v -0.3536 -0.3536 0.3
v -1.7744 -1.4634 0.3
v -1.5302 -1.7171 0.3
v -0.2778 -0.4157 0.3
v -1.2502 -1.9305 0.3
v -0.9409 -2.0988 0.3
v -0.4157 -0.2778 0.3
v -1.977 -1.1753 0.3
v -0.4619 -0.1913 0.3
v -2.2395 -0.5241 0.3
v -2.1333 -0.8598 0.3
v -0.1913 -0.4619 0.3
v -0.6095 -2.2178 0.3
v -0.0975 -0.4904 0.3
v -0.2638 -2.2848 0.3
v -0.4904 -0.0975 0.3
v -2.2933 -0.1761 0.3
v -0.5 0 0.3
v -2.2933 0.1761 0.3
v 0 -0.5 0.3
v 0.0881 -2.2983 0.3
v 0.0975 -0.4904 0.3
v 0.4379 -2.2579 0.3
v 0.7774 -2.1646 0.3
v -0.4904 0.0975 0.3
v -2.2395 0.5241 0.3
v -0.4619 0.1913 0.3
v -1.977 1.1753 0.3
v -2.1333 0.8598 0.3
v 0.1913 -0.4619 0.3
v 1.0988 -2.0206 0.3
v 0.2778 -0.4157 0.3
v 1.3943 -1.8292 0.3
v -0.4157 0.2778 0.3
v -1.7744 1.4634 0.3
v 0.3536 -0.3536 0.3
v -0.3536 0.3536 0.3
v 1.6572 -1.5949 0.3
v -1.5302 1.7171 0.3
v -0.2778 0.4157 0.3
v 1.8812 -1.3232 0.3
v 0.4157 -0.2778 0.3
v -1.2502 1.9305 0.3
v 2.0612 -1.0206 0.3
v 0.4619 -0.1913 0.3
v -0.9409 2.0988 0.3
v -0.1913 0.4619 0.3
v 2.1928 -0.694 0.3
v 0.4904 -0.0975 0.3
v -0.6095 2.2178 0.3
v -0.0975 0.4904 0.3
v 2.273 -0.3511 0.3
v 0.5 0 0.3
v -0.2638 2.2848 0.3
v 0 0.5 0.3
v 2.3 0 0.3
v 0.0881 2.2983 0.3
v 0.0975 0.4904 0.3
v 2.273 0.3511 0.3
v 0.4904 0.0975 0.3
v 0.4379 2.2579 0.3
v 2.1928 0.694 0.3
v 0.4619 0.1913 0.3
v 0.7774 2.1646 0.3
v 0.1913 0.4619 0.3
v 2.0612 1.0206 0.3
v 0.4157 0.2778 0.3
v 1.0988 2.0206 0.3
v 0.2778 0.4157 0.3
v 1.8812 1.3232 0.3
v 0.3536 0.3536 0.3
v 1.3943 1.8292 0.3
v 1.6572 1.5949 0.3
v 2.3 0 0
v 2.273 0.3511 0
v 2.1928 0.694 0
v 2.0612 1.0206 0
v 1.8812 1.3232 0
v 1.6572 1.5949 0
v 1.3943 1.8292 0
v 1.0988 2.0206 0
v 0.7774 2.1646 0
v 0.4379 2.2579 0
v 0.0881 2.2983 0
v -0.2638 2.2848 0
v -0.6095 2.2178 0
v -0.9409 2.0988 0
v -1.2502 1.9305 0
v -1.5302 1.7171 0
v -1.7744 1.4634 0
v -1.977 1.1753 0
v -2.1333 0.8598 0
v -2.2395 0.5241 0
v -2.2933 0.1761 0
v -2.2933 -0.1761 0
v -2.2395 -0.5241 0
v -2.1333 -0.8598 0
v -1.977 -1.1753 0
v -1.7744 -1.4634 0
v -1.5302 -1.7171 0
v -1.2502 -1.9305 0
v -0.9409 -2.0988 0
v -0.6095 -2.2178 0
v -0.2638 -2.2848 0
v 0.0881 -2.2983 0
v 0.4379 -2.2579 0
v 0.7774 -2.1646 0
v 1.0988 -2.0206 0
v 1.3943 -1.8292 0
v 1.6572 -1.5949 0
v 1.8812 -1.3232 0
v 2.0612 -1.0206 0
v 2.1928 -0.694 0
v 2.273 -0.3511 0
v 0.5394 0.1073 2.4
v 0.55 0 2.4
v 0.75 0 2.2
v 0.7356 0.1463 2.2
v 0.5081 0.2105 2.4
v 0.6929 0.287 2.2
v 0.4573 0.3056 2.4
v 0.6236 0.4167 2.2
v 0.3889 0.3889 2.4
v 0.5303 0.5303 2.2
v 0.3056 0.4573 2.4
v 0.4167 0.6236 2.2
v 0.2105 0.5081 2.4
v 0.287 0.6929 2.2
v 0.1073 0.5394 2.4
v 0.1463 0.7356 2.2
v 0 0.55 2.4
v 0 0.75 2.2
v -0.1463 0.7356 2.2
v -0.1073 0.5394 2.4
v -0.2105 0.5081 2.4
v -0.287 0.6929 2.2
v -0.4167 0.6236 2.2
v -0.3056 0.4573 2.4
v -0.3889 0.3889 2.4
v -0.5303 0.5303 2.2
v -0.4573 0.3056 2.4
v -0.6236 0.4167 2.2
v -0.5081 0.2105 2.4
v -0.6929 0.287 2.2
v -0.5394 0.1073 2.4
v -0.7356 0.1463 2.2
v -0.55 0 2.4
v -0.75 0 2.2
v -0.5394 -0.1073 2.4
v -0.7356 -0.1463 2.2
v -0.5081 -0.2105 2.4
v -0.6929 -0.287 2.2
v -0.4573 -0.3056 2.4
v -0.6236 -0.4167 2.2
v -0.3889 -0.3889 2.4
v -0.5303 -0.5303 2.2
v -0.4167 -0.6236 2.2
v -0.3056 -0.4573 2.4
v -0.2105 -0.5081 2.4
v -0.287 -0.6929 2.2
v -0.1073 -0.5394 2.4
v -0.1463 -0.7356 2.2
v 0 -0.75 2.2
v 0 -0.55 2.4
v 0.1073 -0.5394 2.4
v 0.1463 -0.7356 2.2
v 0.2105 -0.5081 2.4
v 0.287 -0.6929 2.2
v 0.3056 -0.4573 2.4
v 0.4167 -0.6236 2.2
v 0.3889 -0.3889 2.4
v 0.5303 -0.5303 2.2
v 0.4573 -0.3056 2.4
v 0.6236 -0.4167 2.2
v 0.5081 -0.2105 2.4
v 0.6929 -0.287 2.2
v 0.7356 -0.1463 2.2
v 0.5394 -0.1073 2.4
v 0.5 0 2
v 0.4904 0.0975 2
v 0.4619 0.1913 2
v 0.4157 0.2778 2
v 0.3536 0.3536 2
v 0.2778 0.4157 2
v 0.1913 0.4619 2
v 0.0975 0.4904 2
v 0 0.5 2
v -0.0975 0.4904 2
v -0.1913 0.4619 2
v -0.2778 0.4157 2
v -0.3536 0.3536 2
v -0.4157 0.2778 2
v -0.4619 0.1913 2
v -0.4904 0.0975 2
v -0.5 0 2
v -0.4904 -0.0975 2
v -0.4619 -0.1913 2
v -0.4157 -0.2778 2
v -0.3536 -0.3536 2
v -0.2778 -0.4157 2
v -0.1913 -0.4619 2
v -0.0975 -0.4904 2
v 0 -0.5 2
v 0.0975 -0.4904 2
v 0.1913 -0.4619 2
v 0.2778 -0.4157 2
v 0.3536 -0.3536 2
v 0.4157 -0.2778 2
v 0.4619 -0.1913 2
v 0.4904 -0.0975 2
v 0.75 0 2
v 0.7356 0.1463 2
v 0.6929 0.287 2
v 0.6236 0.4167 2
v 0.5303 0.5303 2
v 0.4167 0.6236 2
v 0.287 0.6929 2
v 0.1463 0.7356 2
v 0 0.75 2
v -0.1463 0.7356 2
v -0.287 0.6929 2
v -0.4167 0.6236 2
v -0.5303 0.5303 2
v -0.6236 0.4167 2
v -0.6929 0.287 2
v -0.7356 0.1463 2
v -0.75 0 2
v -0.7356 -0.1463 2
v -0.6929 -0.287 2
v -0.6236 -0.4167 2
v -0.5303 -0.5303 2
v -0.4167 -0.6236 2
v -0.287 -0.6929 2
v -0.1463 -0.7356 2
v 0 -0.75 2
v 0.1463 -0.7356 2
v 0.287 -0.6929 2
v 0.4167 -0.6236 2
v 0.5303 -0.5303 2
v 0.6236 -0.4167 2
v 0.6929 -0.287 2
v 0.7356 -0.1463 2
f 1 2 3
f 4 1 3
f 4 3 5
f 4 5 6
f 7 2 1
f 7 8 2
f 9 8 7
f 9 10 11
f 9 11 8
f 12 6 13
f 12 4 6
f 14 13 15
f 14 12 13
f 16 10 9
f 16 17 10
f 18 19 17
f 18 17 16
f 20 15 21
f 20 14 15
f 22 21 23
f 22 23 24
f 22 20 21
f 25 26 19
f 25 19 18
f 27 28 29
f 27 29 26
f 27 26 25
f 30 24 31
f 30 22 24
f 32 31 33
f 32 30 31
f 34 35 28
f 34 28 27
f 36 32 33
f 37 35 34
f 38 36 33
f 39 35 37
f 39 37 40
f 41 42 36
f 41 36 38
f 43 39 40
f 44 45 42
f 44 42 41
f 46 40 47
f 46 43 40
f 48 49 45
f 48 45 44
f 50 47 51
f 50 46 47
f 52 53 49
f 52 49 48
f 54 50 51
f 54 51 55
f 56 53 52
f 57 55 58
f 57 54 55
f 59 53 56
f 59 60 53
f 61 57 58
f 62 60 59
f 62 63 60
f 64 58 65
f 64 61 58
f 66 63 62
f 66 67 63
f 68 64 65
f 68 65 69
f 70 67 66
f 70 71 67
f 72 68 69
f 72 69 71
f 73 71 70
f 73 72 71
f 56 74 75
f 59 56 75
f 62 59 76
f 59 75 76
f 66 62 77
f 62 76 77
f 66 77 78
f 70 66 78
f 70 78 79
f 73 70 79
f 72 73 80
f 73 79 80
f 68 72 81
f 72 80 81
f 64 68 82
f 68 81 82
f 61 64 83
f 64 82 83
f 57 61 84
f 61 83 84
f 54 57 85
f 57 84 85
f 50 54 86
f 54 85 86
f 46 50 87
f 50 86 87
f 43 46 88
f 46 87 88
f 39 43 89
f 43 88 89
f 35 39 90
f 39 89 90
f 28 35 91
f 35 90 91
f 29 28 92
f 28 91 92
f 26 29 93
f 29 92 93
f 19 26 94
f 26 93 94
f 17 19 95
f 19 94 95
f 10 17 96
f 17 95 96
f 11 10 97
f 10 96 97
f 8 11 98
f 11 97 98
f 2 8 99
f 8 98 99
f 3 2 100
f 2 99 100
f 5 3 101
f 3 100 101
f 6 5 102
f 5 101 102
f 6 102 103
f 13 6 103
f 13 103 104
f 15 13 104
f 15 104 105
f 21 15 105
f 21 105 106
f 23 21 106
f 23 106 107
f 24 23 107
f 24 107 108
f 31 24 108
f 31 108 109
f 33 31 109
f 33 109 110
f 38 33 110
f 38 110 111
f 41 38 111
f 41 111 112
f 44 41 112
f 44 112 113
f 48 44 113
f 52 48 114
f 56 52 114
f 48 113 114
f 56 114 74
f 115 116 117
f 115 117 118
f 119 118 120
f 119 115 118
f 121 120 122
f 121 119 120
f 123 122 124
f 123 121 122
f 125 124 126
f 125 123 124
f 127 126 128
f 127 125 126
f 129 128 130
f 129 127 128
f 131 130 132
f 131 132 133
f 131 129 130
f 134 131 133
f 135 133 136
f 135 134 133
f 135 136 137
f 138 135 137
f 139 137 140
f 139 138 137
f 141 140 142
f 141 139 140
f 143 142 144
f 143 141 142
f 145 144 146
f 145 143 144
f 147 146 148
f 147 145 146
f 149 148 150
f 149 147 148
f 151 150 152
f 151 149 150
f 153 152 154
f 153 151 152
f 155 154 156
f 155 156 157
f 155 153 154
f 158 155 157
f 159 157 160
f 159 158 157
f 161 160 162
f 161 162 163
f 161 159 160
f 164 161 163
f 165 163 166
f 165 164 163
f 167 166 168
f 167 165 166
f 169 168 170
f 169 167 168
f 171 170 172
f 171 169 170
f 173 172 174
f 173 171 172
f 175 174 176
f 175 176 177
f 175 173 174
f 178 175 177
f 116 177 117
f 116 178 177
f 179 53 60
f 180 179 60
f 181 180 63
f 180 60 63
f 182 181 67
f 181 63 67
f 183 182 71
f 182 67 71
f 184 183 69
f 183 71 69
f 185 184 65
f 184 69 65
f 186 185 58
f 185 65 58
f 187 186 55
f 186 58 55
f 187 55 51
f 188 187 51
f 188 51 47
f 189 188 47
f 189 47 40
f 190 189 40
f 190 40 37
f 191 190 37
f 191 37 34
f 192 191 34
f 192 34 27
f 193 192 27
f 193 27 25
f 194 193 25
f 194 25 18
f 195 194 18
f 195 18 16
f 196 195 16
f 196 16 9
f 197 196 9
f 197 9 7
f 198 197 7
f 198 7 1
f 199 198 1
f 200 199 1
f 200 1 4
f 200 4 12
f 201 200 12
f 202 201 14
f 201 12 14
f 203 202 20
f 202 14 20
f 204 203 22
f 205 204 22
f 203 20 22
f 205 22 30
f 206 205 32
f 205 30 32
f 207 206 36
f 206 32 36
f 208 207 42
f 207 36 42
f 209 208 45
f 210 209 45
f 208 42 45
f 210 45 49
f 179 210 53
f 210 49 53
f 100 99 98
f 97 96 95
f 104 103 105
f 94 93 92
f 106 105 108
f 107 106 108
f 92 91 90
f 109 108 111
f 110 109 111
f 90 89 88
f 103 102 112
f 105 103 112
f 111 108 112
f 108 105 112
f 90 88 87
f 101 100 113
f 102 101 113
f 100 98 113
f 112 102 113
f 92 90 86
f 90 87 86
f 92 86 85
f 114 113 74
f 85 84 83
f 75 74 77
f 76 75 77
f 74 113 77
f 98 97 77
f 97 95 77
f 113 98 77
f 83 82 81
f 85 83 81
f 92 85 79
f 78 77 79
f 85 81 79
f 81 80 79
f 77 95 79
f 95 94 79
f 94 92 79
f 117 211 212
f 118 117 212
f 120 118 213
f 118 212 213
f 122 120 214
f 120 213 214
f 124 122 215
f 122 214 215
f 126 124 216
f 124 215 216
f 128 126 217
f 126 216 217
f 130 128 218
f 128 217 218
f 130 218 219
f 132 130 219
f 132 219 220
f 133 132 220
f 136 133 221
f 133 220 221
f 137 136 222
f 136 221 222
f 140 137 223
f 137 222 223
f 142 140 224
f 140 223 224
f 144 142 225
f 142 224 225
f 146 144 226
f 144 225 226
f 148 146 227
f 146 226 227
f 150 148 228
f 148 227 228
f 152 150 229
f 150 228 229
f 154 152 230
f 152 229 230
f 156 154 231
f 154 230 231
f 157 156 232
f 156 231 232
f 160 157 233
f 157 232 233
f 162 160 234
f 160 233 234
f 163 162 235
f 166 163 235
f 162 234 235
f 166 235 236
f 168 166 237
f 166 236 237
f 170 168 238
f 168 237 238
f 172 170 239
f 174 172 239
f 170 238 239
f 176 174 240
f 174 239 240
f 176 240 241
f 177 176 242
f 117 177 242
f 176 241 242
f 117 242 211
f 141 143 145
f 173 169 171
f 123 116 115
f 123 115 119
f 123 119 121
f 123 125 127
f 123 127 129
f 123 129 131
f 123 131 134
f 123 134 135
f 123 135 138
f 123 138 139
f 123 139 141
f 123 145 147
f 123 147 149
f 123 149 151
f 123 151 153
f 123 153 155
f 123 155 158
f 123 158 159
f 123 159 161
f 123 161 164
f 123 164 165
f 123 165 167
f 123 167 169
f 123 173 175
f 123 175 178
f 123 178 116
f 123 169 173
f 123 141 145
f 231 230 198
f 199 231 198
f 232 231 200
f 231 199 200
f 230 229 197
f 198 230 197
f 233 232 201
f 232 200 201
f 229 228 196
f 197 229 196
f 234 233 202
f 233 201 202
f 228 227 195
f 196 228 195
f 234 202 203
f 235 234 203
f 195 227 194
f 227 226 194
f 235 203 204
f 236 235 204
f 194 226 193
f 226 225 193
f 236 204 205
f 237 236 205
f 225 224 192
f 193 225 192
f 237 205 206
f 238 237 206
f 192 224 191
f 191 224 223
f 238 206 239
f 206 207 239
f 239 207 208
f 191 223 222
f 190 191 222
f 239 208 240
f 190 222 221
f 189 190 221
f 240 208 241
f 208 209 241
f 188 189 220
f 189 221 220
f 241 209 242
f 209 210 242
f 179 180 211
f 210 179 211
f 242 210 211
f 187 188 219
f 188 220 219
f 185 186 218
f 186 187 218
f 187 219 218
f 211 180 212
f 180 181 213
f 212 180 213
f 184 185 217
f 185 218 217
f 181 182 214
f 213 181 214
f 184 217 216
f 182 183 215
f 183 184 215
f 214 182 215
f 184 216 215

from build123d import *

# Parameters (mm, degrees)
CYLINDER_R        = 2.3
CYLINDER_DEPTH    = 0.3
CYLINDER001_R     = 0.5
CYLINDER001_DEPTH = 2
CYLINDER002_R     = 0.75
CYLINDER002_DEPTH = 0.4
CHAMFER_SIZE      = 0.2


with BuildPart() as part:
    # Cylinder → Cylinder (join)
    with BuildSketch(Plane.XY):
        Circle(CYLINDER_R)
    extrude(amount=CYLINDER_DEPTH)

    # Cylinder001 → Cylinder001 (join)
    with BuildSketch(Plane.XY):
        Circle(CYLINDER001_R)
    extrude(amount=CYLINDER001_DEPTH)

    # Cylinder002 → Cylinder002 (join)
    with BuildSketch(Plane.XY.offset(2)):
        Circle(CYLINDER002_R)
    extrude(amount=CYLINDER002_DEPTH)

    # Chamfer
    chamfer_edges = [part.edges().sort_by_distance(p)[0] for p in [
        (-0.75, 0, 2.4),
    ]]
    chamfer(chamfer_edges, length=CHAMFER_SIZE)


solid = part.part
